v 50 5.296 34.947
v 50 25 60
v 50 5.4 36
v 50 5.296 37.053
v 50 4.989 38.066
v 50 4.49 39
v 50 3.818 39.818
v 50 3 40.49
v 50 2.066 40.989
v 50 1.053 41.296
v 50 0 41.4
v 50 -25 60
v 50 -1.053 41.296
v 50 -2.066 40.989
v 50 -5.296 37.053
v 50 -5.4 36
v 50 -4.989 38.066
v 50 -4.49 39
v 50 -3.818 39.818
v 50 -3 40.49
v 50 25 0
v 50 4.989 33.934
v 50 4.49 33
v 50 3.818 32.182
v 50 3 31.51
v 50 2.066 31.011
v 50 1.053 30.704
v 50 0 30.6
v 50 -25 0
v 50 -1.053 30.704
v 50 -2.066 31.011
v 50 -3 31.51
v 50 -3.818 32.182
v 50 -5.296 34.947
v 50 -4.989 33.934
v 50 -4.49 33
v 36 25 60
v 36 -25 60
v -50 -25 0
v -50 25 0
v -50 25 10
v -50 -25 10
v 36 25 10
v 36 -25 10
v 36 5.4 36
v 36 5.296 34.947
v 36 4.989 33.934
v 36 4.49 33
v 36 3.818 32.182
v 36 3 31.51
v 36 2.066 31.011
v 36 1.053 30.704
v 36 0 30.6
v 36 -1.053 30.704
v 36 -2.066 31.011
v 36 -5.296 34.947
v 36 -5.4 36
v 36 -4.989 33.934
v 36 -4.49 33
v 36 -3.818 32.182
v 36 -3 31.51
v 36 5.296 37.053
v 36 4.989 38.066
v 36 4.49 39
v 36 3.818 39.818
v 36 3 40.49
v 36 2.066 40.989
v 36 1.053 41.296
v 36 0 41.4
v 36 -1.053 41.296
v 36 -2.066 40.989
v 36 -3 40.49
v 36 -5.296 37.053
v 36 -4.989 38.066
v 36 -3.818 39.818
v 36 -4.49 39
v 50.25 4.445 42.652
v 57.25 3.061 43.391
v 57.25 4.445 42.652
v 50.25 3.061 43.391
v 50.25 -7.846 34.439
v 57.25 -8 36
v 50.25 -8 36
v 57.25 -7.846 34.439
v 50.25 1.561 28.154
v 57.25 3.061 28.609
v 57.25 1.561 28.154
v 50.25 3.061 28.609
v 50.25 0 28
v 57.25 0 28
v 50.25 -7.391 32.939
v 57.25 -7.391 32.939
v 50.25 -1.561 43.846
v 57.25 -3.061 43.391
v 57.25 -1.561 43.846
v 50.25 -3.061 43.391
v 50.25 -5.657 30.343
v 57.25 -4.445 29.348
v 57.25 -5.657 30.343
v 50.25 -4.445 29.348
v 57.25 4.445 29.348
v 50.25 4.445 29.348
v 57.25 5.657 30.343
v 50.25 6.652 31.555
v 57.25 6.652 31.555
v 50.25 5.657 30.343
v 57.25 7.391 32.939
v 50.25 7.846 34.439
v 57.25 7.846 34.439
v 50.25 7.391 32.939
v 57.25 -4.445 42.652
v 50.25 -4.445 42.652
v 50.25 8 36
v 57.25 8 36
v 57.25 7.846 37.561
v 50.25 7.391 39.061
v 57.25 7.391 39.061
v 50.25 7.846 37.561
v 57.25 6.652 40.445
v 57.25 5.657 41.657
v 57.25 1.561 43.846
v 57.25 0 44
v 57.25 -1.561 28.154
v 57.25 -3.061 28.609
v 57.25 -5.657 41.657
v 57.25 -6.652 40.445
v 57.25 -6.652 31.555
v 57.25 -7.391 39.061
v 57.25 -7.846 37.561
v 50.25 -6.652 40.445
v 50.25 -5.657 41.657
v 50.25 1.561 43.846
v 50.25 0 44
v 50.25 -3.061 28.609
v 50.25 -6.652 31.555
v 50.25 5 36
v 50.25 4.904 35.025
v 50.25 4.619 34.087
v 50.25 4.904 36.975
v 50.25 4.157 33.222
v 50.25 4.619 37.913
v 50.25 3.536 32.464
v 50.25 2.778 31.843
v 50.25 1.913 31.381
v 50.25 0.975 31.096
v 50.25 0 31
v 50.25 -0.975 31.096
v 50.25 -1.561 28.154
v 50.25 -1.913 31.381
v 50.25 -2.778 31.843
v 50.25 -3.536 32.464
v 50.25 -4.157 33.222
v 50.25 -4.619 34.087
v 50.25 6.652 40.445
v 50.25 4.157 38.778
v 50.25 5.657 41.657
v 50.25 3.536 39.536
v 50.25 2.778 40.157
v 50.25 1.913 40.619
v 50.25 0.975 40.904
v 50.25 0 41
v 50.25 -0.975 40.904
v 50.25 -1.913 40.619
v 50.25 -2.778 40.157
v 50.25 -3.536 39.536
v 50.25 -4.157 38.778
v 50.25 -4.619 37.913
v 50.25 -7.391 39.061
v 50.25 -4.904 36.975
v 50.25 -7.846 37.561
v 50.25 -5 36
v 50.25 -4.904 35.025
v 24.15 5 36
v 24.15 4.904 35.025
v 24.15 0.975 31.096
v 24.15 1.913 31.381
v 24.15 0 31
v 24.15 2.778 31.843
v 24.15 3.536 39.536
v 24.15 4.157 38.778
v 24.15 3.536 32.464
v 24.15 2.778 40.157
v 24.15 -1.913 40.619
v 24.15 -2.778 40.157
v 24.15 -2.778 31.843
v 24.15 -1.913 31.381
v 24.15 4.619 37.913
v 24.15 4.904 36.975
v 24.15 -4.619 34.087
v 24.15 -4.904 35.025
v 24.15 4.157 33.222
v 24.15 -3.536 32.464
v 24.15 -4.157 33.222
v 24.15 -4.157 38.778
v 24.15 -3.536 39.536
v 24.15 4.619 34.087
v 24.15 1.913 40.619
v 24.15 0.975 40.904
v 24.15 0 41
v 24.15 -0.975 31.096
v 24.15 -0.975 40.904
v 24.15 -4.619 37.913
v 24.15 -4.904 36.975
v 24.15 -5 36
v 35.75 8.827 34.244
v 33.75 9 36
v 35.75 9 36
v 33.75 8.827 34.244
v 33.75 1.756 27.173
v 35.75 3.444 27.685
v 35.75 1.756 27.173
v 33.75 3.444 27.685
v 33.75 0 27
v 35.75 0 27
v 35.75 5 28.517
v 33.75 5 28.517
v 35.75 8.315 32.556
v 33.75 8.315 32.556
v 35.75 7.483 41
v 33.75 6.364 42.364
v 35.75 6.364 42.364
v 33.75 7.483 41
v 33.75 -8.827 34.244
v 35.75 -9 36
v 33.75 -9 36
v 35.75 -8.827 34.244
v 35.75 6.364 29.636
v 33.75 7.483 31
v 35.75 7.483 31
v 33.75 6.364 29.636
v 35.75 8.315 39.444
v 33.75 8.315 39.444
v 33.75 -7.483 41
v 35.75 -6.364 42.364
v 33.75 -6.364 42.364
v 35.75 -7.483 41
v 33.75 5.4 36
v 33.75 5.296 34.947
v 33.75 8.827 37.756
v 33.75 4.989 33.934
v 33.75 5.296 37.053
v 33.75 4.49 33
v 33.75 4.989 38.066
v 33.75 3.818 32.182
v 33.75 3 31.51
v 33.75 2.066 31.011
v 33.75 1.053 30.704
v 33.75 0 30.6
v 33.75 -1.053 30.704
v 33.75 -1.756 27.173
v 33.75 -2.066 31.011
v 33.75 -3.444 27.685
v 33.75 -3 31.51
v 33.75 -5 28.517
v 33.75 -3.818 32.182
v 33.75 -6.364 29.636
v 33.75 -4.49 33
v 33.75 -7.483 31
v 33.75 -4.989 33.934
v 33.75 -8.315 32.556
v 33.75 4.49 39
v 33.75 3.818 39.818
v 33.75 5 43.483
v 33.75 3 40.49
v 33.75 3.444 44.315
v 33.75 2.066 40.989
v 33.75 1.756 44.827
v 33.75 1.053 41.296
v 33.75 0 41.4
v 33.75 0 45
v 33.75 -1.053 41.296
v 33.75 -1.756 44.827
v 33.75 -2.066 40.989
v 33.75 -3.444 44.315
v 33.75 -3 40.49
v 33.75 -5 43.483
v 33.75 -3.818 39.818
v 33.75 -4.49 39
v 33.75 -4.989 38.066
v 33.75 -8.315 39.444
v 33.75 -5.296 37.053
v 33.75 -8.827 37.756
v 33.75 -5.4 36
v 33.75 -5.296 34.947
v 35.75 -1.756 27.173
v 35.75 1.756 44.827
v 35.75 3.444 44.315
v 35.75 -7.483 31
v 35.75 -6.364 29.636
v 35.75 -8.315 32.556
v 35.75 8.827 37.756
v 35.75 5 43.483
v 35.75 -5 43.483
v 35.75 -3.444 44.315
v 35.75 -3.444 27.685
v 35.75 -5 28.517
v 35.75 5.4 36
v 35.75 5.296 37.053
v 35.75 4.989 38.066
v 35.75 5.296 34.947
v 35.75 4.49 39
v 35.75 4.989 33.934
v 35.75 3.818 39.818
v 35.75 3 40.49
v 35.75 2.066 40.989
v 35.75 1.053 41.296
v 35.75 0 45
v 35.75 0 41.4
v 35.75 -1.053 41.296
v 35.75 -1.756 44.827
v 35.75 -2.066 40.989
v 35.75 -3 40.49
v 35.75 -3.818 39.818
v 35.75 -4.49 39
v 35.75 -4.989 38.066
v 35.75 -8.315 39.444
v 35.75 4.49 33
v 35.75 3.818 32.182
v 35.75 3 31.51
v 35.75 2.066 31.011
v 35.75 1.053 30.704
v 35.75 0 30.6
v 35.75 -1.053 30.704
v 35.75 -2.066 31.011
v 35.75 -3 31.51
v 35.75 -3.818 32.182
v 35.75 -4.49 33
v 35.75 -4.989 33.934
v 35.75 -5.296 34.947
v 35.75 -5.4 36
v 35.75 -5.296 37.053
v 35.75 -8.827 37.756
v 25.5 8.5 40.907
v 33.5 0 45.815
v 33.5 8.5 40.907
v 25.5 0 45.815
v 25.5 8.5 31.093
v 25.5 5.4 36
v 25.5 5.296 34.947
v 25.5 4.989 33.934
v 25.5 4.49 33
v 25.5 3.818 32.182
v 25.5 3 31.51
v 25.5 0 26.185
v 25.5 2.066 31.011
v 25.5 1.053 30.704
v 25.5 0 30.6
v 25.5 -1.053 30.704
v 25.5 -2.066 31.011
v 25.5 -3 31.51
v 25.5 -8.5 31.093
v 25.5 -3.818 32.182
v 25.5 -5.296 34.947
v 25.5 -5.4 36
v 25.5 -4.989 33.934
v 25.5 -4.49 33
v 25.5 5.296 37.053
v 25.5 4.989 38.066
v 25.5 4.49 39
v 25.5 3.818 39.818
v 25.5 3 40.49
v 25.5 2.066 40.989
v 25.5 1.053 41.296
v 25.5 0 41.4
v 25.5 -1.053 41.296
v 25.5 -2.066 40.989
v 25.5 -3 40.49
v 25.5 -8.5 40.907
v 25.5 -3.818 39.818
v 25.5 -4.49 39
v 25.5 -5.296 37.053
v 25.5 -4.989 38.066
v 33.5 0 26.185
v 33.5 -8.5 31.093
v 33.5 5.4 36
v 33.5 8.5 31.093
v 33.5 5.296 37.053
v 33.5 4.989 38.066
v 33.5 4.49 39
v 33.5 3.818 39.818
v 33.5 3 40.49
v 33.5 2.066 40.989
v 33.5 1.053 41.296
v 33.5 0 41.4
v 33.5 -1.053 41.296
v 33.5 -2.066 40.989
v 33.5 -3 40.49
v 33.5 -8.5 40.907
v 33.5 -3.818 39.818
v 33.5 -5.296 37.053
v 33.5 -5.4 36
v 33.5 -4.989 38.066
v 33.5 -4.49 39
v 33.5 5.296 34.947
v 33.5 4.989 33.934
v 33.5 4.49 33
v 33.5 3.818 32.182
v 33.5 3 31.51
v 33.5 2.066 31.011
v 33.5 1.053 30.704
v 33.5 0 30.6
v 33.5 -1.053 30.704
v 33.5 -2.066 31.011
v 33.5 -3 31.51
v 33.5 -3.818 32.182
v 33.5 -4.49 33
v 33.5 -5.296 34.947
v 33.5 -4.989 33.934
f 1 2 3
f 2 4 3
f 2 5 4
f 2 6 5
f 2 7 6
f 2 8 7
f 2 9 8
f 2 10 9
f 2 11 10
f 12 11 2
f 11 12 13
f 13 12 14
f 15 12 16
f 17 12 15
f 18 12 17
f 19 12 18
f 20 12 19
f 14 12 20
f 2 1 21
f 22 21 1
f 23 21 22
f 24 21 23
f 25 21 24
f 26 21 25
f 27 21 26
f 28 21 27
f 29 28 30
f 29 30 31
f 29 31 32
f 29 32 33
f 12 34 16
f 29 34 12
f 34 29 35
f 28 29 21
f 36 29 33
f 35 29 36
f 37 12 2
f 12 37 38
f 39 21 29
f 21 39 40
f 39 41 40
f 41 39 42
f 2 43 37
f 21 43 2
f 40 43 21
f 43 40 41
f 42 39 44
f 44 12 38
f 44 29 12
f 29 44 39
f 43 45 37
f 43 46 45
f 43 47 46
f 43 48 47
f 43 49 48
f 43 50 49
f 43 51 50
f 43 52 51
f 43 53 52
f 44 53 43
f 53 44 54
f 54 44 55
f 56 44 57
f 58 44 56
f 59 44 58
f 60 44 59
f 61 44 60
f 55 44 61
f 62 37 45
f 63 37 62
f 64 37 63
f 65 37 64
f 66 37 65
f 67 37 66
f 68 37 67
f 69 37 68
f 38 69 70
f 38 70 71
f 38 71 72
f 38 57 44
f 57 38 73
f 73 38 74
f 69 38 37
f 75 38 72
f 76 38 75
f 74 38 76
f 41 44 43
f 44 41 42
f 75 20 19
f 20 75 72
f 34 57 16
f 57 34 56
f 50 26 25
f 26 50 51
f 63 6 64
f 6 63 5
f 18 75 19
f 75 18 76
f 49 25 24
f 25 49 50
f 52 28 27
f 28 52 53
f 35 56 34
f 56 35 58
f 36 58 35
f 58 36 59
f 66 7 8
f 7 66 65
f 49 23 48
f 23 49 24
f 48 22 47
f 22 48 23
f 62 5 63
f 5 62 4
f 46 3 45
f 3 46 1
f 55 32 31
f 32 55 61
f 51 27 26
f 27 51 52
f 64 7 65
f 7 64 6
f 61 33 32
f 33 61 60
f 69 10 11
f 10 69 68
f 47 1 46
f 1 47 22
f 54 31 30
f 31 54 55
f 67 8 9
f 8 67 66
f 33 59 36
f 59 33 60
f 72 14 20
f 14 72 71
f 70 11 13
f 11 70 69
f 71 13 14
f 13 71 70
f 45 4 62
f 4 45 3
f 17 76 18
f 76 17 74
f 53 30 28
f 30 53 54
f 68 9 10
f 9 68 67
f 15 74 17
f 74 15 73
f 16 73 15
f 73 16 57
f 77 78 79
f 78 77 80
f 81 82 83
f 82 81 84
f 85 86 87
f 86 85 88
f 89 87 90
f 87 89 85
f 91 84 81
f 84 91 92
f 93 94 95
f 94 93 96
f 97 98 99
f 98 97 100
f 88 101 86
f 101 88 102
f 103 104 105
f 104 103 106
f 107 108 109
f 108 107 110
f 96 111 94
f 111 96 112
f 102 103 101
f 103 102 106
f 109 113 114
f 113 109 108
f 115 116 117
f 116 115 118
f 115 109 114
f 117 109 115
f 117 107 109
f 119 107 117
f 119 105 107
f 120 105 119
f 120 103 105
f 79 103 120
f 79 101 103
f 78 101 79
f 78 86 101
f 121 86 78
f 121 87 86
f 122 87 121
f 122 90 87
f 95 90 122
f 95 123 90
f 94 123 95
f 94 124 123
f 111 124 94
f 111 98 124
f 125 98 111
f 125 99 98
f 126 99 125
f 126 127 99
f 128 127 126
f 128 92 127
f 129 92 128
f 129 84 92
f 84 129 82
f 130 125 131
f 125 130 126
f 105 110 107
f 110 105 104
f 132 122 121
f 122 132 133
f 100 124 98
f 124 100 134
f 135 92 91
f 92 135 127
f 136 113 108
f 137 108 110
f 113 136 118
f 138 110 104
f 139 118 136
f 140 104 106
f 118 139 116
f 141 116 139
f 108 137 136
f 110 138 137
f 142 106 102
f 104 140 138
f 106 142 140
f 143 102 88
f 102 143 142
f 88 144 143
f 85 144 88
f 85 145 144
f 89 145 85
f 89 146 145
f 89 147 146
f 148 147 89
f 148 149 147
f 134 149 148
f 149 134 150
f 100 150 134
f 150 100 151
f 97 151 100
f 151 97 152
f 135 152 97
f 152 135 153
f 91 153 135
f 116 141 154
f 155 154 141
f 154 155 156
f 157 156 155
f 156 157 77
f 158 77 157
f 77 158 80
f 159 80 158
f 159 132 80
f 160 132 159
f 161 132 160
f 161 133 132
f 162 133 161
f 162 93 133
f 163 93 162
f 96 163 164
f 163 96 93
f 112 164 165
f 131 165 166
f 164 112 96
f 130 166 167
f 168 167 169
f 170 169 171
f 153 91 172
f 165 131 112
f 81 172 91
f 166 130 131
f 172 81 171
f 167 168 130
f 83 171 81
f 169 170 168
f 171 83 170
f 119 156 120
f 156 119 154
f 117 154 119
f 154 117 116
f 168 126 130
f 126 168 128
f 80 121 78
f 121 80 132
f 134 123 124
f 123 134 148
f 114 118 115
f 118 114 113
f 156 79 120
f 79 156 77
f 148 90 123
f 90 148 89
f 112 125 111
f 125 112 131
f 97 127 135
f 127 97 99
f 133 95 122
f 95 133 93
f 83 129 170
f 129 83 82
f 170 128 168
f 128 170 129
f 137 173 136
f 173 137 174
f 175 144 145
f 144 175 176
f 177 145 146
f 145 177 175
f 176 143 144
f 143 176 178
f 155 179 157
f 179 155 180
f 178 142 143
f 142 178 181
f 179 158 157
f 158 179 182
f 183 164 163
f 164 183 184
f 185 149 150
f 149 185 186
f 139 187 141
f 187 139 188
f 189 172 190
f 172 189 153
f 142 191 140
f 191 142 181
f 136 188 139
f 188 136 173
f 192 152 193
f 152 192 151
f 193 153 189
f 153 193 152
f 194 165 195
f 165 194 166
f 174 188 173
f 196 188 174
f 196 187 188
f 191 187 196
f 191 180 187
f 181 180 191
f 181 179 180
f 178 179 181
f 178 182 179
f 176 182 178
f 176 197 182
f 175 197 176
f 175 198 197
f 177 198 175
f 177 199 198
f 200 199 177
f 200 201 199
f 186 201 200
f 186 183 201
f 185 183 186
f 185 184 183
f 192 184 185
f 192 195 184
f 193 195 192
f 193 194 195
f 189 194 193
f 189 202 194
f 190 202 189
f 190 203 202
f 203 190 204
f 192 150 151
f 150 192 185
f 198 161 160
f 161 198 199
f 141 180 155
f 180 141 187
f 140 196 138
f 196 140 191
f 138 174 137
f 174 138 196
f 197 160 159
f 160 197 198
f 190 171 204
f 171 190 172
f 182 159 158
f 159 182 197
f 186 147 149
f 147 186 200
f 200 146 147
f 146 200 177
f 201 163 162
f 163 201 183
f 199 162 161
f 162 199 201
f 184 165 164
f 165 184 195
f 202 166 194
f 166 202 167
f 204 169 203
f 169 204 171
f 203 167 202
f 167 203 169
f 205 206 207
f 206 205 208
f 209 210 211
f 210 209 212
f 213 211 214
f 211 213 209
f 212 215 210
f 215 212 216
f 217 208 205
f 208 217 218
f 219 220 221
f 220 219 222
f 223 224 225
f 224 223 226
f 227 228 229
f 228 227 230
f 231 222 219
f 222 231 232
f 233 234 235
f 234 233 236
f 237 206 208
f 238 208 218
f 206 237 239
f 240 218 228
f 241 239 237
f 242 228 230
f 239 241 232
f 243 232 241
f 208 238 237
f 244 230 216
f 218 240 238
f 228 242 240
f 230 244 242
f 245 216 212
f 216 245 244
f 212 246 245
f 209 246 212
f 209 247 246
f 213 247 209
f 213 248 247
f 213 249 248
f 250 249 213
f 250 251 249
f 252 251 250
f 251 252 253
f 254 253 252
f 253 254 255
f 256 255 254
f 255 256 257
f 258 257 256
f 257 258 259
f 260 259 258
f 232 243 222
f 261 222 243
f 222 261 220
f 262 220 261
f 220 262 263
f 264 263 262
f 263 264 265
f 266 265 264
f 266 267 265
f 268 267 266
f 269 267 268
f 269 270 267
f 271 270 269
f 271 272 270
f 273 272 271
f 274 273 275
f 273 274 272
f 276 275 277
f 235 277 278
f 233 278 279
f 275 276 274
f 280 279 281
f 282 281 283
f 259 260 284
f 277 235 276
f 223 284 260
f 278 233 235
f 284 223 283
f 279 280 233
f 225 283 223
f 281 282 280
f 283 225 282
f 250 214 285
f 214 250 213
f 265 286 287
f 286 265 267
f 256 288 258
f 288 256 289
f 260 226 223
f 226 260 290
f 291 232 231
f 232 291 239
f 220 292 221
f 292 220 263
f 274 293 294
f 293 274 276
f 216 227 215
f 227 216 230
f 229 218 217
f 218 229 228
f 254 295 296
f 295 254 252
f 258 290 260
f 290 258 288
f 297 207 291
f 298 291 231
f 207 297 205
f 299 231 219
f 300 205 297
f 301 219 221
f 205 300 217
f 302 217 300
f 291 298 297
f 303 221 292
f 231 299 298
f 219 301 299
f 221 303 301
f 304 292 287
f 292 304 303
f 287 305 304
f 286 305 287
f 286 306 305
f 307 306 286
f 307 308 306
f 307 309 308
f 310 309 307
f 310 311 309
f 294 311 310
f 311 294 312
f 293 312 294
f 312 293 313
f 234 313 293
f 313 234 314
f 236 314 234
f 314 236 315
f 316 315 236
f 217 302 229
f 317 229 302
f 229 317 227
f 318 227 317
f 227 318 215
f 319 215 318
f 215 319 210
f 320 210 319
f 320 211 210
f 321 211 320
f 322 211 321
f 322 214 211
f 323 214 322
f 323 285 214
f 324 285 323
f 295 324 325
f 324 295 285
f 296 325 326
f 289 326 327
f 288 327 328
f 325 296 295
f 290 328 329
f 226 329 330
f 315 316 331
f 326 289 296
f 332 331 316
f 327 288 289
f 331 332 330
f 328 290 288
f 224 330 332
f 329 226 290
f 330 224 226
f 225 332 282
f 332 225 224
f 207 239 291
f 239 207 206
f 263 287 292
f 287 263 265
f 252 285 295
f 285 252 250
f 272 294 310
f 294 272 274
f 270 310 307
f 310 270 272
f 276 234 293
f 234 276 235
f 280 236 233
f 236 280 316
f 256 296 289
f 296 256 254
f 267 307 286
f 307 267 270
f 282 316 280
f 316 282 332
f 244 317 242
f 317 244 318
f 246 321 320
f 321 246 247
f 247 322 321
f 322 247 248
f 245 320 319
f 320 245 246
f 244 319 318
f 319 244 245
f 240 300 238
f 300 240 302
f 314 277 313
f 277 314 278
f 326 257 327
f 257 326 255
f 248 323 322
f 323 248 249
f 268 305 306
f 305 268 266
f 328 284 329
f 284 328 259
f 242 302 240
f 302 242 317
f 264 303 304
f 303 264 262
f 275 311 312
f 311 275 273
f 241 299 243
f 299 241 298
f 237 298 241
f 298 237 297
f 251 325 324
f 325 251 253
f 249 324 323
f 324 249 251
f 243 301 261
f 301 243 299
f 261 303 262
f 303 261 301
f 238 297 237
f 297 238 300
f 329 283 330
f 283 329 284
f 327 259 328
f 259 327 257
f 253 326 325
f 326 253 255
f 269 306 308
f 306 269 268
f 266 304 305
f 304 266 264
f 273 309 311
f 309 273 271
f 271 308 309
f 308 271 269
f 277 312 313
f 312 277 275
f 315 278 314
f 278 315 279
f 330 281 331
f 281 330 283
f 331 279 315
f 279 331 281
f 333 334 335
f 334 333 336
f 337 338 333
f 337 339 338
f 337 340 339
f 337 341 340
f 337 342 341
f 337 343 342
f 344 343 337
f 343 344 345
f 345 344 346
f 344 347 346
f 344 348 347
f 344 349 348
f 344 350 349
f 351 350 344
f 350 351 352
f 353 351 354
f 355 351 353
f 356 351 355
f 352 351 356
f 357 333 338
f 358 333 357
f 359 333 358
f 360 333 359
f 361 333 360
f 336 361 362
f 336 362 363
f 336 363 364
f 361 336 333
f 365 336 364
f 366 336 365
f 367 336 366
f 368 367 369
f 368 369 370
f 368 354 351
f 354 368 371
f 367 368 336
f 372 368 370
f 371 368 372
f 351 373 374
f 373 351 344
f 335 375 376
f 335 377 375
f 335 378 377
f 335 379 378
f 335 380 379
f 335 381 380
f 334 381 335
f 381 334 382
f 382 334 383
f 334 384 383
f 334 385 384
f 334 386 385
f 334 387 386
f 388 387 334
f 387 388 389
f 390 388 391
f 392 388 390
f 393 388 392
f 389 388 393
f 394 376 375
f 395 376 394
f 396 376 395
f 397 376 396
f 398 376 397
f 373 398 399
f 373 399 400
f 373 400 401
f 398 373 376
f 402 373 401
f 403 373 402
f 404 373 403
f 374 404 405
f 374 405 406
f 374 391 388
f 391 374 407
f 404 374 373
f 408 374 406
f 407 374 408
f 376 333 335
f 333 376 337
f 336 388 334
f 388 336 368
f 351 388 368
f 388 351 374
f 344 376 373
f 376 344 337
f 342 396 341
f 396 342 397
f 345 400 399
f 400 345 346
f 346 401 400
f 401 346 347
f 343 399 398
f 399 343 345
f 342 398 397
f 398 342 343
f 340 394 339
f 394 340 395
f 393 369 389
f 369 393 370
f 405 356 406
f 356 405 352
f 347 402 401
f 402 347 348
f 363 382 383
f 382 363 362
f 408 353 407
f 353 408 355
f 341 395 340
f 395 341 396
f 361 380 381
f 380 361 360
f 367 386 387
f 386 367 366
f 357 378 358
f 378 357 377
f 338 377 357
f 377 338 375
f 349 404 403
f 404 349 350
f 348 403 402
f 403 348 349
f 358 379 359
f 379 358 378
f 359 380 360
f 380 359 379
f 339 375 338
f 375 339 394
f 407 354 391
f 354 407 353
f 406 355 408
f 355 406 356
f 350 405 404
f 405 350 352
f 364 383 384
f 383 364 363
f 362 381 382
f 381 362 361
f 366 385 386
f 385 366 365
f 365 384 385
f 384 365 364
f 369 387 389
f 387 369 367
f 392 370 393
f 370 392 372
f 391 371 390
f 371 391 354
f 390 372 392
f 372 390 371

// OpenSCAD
$fn = 32;

// ------------------------------------------------------------------------
// Bolted bracket: 100 x 50 mm bracket with 1 bolt joints
// Every part is its own module, assembly() places them once.
// ------------------------------------------------------------------------

// --- part 1 ---
module bracket() {
  difference() {
    translate([-50, -25, 0]) cube([100, 50, 60]);
    translate([-51, -26, 10]) cube([87, 52, 51]);
    translate([43, 0, 36]) rotate([0, 90, 0]) cylinder(h = 16, d = 10.8, center = true);
  }
}

// --- part 2 ---
module bolt() {
  cylinder(h = 7, d = 16);
  translate([0, 0, -26.1]) cylinder(h = 26.1, d = 10);
}

// --- part 3 ---
module washer() {
  difference() {
      translate([0, 0, 0]) cylinder(h = 2, d = 18);
      translate([0, 0, -1]) cylinder(h = 4, d = 10.8);
    }
}

// --- part 4 ---
module nut() {
  difference() {
    linear_extrude(height = 8) polygon(points = [[9.815, 0], [4.907, 8.5], [-4.907, 8.5], [-9.815, 0], [-4.907, -8.5], [4.907, -8.5]]);
    translate([0, 0, -1]) cylinder(h = 10, d = 10.8);
  }
}

// --- assembly ---
module assembly() {
  translate([0, 0, 0]) rotate([0, 0, 0]) bracket();
  translate([50.25, 0, 36]) rotate([0, 90, 0]) bolt();
  translate([33.75, 0, 36]) rotate([0, 90, 0]) washer();
  translate([25.5, 0, 36]) rotate([0, 90, 0]) nut();
}

assembly();
